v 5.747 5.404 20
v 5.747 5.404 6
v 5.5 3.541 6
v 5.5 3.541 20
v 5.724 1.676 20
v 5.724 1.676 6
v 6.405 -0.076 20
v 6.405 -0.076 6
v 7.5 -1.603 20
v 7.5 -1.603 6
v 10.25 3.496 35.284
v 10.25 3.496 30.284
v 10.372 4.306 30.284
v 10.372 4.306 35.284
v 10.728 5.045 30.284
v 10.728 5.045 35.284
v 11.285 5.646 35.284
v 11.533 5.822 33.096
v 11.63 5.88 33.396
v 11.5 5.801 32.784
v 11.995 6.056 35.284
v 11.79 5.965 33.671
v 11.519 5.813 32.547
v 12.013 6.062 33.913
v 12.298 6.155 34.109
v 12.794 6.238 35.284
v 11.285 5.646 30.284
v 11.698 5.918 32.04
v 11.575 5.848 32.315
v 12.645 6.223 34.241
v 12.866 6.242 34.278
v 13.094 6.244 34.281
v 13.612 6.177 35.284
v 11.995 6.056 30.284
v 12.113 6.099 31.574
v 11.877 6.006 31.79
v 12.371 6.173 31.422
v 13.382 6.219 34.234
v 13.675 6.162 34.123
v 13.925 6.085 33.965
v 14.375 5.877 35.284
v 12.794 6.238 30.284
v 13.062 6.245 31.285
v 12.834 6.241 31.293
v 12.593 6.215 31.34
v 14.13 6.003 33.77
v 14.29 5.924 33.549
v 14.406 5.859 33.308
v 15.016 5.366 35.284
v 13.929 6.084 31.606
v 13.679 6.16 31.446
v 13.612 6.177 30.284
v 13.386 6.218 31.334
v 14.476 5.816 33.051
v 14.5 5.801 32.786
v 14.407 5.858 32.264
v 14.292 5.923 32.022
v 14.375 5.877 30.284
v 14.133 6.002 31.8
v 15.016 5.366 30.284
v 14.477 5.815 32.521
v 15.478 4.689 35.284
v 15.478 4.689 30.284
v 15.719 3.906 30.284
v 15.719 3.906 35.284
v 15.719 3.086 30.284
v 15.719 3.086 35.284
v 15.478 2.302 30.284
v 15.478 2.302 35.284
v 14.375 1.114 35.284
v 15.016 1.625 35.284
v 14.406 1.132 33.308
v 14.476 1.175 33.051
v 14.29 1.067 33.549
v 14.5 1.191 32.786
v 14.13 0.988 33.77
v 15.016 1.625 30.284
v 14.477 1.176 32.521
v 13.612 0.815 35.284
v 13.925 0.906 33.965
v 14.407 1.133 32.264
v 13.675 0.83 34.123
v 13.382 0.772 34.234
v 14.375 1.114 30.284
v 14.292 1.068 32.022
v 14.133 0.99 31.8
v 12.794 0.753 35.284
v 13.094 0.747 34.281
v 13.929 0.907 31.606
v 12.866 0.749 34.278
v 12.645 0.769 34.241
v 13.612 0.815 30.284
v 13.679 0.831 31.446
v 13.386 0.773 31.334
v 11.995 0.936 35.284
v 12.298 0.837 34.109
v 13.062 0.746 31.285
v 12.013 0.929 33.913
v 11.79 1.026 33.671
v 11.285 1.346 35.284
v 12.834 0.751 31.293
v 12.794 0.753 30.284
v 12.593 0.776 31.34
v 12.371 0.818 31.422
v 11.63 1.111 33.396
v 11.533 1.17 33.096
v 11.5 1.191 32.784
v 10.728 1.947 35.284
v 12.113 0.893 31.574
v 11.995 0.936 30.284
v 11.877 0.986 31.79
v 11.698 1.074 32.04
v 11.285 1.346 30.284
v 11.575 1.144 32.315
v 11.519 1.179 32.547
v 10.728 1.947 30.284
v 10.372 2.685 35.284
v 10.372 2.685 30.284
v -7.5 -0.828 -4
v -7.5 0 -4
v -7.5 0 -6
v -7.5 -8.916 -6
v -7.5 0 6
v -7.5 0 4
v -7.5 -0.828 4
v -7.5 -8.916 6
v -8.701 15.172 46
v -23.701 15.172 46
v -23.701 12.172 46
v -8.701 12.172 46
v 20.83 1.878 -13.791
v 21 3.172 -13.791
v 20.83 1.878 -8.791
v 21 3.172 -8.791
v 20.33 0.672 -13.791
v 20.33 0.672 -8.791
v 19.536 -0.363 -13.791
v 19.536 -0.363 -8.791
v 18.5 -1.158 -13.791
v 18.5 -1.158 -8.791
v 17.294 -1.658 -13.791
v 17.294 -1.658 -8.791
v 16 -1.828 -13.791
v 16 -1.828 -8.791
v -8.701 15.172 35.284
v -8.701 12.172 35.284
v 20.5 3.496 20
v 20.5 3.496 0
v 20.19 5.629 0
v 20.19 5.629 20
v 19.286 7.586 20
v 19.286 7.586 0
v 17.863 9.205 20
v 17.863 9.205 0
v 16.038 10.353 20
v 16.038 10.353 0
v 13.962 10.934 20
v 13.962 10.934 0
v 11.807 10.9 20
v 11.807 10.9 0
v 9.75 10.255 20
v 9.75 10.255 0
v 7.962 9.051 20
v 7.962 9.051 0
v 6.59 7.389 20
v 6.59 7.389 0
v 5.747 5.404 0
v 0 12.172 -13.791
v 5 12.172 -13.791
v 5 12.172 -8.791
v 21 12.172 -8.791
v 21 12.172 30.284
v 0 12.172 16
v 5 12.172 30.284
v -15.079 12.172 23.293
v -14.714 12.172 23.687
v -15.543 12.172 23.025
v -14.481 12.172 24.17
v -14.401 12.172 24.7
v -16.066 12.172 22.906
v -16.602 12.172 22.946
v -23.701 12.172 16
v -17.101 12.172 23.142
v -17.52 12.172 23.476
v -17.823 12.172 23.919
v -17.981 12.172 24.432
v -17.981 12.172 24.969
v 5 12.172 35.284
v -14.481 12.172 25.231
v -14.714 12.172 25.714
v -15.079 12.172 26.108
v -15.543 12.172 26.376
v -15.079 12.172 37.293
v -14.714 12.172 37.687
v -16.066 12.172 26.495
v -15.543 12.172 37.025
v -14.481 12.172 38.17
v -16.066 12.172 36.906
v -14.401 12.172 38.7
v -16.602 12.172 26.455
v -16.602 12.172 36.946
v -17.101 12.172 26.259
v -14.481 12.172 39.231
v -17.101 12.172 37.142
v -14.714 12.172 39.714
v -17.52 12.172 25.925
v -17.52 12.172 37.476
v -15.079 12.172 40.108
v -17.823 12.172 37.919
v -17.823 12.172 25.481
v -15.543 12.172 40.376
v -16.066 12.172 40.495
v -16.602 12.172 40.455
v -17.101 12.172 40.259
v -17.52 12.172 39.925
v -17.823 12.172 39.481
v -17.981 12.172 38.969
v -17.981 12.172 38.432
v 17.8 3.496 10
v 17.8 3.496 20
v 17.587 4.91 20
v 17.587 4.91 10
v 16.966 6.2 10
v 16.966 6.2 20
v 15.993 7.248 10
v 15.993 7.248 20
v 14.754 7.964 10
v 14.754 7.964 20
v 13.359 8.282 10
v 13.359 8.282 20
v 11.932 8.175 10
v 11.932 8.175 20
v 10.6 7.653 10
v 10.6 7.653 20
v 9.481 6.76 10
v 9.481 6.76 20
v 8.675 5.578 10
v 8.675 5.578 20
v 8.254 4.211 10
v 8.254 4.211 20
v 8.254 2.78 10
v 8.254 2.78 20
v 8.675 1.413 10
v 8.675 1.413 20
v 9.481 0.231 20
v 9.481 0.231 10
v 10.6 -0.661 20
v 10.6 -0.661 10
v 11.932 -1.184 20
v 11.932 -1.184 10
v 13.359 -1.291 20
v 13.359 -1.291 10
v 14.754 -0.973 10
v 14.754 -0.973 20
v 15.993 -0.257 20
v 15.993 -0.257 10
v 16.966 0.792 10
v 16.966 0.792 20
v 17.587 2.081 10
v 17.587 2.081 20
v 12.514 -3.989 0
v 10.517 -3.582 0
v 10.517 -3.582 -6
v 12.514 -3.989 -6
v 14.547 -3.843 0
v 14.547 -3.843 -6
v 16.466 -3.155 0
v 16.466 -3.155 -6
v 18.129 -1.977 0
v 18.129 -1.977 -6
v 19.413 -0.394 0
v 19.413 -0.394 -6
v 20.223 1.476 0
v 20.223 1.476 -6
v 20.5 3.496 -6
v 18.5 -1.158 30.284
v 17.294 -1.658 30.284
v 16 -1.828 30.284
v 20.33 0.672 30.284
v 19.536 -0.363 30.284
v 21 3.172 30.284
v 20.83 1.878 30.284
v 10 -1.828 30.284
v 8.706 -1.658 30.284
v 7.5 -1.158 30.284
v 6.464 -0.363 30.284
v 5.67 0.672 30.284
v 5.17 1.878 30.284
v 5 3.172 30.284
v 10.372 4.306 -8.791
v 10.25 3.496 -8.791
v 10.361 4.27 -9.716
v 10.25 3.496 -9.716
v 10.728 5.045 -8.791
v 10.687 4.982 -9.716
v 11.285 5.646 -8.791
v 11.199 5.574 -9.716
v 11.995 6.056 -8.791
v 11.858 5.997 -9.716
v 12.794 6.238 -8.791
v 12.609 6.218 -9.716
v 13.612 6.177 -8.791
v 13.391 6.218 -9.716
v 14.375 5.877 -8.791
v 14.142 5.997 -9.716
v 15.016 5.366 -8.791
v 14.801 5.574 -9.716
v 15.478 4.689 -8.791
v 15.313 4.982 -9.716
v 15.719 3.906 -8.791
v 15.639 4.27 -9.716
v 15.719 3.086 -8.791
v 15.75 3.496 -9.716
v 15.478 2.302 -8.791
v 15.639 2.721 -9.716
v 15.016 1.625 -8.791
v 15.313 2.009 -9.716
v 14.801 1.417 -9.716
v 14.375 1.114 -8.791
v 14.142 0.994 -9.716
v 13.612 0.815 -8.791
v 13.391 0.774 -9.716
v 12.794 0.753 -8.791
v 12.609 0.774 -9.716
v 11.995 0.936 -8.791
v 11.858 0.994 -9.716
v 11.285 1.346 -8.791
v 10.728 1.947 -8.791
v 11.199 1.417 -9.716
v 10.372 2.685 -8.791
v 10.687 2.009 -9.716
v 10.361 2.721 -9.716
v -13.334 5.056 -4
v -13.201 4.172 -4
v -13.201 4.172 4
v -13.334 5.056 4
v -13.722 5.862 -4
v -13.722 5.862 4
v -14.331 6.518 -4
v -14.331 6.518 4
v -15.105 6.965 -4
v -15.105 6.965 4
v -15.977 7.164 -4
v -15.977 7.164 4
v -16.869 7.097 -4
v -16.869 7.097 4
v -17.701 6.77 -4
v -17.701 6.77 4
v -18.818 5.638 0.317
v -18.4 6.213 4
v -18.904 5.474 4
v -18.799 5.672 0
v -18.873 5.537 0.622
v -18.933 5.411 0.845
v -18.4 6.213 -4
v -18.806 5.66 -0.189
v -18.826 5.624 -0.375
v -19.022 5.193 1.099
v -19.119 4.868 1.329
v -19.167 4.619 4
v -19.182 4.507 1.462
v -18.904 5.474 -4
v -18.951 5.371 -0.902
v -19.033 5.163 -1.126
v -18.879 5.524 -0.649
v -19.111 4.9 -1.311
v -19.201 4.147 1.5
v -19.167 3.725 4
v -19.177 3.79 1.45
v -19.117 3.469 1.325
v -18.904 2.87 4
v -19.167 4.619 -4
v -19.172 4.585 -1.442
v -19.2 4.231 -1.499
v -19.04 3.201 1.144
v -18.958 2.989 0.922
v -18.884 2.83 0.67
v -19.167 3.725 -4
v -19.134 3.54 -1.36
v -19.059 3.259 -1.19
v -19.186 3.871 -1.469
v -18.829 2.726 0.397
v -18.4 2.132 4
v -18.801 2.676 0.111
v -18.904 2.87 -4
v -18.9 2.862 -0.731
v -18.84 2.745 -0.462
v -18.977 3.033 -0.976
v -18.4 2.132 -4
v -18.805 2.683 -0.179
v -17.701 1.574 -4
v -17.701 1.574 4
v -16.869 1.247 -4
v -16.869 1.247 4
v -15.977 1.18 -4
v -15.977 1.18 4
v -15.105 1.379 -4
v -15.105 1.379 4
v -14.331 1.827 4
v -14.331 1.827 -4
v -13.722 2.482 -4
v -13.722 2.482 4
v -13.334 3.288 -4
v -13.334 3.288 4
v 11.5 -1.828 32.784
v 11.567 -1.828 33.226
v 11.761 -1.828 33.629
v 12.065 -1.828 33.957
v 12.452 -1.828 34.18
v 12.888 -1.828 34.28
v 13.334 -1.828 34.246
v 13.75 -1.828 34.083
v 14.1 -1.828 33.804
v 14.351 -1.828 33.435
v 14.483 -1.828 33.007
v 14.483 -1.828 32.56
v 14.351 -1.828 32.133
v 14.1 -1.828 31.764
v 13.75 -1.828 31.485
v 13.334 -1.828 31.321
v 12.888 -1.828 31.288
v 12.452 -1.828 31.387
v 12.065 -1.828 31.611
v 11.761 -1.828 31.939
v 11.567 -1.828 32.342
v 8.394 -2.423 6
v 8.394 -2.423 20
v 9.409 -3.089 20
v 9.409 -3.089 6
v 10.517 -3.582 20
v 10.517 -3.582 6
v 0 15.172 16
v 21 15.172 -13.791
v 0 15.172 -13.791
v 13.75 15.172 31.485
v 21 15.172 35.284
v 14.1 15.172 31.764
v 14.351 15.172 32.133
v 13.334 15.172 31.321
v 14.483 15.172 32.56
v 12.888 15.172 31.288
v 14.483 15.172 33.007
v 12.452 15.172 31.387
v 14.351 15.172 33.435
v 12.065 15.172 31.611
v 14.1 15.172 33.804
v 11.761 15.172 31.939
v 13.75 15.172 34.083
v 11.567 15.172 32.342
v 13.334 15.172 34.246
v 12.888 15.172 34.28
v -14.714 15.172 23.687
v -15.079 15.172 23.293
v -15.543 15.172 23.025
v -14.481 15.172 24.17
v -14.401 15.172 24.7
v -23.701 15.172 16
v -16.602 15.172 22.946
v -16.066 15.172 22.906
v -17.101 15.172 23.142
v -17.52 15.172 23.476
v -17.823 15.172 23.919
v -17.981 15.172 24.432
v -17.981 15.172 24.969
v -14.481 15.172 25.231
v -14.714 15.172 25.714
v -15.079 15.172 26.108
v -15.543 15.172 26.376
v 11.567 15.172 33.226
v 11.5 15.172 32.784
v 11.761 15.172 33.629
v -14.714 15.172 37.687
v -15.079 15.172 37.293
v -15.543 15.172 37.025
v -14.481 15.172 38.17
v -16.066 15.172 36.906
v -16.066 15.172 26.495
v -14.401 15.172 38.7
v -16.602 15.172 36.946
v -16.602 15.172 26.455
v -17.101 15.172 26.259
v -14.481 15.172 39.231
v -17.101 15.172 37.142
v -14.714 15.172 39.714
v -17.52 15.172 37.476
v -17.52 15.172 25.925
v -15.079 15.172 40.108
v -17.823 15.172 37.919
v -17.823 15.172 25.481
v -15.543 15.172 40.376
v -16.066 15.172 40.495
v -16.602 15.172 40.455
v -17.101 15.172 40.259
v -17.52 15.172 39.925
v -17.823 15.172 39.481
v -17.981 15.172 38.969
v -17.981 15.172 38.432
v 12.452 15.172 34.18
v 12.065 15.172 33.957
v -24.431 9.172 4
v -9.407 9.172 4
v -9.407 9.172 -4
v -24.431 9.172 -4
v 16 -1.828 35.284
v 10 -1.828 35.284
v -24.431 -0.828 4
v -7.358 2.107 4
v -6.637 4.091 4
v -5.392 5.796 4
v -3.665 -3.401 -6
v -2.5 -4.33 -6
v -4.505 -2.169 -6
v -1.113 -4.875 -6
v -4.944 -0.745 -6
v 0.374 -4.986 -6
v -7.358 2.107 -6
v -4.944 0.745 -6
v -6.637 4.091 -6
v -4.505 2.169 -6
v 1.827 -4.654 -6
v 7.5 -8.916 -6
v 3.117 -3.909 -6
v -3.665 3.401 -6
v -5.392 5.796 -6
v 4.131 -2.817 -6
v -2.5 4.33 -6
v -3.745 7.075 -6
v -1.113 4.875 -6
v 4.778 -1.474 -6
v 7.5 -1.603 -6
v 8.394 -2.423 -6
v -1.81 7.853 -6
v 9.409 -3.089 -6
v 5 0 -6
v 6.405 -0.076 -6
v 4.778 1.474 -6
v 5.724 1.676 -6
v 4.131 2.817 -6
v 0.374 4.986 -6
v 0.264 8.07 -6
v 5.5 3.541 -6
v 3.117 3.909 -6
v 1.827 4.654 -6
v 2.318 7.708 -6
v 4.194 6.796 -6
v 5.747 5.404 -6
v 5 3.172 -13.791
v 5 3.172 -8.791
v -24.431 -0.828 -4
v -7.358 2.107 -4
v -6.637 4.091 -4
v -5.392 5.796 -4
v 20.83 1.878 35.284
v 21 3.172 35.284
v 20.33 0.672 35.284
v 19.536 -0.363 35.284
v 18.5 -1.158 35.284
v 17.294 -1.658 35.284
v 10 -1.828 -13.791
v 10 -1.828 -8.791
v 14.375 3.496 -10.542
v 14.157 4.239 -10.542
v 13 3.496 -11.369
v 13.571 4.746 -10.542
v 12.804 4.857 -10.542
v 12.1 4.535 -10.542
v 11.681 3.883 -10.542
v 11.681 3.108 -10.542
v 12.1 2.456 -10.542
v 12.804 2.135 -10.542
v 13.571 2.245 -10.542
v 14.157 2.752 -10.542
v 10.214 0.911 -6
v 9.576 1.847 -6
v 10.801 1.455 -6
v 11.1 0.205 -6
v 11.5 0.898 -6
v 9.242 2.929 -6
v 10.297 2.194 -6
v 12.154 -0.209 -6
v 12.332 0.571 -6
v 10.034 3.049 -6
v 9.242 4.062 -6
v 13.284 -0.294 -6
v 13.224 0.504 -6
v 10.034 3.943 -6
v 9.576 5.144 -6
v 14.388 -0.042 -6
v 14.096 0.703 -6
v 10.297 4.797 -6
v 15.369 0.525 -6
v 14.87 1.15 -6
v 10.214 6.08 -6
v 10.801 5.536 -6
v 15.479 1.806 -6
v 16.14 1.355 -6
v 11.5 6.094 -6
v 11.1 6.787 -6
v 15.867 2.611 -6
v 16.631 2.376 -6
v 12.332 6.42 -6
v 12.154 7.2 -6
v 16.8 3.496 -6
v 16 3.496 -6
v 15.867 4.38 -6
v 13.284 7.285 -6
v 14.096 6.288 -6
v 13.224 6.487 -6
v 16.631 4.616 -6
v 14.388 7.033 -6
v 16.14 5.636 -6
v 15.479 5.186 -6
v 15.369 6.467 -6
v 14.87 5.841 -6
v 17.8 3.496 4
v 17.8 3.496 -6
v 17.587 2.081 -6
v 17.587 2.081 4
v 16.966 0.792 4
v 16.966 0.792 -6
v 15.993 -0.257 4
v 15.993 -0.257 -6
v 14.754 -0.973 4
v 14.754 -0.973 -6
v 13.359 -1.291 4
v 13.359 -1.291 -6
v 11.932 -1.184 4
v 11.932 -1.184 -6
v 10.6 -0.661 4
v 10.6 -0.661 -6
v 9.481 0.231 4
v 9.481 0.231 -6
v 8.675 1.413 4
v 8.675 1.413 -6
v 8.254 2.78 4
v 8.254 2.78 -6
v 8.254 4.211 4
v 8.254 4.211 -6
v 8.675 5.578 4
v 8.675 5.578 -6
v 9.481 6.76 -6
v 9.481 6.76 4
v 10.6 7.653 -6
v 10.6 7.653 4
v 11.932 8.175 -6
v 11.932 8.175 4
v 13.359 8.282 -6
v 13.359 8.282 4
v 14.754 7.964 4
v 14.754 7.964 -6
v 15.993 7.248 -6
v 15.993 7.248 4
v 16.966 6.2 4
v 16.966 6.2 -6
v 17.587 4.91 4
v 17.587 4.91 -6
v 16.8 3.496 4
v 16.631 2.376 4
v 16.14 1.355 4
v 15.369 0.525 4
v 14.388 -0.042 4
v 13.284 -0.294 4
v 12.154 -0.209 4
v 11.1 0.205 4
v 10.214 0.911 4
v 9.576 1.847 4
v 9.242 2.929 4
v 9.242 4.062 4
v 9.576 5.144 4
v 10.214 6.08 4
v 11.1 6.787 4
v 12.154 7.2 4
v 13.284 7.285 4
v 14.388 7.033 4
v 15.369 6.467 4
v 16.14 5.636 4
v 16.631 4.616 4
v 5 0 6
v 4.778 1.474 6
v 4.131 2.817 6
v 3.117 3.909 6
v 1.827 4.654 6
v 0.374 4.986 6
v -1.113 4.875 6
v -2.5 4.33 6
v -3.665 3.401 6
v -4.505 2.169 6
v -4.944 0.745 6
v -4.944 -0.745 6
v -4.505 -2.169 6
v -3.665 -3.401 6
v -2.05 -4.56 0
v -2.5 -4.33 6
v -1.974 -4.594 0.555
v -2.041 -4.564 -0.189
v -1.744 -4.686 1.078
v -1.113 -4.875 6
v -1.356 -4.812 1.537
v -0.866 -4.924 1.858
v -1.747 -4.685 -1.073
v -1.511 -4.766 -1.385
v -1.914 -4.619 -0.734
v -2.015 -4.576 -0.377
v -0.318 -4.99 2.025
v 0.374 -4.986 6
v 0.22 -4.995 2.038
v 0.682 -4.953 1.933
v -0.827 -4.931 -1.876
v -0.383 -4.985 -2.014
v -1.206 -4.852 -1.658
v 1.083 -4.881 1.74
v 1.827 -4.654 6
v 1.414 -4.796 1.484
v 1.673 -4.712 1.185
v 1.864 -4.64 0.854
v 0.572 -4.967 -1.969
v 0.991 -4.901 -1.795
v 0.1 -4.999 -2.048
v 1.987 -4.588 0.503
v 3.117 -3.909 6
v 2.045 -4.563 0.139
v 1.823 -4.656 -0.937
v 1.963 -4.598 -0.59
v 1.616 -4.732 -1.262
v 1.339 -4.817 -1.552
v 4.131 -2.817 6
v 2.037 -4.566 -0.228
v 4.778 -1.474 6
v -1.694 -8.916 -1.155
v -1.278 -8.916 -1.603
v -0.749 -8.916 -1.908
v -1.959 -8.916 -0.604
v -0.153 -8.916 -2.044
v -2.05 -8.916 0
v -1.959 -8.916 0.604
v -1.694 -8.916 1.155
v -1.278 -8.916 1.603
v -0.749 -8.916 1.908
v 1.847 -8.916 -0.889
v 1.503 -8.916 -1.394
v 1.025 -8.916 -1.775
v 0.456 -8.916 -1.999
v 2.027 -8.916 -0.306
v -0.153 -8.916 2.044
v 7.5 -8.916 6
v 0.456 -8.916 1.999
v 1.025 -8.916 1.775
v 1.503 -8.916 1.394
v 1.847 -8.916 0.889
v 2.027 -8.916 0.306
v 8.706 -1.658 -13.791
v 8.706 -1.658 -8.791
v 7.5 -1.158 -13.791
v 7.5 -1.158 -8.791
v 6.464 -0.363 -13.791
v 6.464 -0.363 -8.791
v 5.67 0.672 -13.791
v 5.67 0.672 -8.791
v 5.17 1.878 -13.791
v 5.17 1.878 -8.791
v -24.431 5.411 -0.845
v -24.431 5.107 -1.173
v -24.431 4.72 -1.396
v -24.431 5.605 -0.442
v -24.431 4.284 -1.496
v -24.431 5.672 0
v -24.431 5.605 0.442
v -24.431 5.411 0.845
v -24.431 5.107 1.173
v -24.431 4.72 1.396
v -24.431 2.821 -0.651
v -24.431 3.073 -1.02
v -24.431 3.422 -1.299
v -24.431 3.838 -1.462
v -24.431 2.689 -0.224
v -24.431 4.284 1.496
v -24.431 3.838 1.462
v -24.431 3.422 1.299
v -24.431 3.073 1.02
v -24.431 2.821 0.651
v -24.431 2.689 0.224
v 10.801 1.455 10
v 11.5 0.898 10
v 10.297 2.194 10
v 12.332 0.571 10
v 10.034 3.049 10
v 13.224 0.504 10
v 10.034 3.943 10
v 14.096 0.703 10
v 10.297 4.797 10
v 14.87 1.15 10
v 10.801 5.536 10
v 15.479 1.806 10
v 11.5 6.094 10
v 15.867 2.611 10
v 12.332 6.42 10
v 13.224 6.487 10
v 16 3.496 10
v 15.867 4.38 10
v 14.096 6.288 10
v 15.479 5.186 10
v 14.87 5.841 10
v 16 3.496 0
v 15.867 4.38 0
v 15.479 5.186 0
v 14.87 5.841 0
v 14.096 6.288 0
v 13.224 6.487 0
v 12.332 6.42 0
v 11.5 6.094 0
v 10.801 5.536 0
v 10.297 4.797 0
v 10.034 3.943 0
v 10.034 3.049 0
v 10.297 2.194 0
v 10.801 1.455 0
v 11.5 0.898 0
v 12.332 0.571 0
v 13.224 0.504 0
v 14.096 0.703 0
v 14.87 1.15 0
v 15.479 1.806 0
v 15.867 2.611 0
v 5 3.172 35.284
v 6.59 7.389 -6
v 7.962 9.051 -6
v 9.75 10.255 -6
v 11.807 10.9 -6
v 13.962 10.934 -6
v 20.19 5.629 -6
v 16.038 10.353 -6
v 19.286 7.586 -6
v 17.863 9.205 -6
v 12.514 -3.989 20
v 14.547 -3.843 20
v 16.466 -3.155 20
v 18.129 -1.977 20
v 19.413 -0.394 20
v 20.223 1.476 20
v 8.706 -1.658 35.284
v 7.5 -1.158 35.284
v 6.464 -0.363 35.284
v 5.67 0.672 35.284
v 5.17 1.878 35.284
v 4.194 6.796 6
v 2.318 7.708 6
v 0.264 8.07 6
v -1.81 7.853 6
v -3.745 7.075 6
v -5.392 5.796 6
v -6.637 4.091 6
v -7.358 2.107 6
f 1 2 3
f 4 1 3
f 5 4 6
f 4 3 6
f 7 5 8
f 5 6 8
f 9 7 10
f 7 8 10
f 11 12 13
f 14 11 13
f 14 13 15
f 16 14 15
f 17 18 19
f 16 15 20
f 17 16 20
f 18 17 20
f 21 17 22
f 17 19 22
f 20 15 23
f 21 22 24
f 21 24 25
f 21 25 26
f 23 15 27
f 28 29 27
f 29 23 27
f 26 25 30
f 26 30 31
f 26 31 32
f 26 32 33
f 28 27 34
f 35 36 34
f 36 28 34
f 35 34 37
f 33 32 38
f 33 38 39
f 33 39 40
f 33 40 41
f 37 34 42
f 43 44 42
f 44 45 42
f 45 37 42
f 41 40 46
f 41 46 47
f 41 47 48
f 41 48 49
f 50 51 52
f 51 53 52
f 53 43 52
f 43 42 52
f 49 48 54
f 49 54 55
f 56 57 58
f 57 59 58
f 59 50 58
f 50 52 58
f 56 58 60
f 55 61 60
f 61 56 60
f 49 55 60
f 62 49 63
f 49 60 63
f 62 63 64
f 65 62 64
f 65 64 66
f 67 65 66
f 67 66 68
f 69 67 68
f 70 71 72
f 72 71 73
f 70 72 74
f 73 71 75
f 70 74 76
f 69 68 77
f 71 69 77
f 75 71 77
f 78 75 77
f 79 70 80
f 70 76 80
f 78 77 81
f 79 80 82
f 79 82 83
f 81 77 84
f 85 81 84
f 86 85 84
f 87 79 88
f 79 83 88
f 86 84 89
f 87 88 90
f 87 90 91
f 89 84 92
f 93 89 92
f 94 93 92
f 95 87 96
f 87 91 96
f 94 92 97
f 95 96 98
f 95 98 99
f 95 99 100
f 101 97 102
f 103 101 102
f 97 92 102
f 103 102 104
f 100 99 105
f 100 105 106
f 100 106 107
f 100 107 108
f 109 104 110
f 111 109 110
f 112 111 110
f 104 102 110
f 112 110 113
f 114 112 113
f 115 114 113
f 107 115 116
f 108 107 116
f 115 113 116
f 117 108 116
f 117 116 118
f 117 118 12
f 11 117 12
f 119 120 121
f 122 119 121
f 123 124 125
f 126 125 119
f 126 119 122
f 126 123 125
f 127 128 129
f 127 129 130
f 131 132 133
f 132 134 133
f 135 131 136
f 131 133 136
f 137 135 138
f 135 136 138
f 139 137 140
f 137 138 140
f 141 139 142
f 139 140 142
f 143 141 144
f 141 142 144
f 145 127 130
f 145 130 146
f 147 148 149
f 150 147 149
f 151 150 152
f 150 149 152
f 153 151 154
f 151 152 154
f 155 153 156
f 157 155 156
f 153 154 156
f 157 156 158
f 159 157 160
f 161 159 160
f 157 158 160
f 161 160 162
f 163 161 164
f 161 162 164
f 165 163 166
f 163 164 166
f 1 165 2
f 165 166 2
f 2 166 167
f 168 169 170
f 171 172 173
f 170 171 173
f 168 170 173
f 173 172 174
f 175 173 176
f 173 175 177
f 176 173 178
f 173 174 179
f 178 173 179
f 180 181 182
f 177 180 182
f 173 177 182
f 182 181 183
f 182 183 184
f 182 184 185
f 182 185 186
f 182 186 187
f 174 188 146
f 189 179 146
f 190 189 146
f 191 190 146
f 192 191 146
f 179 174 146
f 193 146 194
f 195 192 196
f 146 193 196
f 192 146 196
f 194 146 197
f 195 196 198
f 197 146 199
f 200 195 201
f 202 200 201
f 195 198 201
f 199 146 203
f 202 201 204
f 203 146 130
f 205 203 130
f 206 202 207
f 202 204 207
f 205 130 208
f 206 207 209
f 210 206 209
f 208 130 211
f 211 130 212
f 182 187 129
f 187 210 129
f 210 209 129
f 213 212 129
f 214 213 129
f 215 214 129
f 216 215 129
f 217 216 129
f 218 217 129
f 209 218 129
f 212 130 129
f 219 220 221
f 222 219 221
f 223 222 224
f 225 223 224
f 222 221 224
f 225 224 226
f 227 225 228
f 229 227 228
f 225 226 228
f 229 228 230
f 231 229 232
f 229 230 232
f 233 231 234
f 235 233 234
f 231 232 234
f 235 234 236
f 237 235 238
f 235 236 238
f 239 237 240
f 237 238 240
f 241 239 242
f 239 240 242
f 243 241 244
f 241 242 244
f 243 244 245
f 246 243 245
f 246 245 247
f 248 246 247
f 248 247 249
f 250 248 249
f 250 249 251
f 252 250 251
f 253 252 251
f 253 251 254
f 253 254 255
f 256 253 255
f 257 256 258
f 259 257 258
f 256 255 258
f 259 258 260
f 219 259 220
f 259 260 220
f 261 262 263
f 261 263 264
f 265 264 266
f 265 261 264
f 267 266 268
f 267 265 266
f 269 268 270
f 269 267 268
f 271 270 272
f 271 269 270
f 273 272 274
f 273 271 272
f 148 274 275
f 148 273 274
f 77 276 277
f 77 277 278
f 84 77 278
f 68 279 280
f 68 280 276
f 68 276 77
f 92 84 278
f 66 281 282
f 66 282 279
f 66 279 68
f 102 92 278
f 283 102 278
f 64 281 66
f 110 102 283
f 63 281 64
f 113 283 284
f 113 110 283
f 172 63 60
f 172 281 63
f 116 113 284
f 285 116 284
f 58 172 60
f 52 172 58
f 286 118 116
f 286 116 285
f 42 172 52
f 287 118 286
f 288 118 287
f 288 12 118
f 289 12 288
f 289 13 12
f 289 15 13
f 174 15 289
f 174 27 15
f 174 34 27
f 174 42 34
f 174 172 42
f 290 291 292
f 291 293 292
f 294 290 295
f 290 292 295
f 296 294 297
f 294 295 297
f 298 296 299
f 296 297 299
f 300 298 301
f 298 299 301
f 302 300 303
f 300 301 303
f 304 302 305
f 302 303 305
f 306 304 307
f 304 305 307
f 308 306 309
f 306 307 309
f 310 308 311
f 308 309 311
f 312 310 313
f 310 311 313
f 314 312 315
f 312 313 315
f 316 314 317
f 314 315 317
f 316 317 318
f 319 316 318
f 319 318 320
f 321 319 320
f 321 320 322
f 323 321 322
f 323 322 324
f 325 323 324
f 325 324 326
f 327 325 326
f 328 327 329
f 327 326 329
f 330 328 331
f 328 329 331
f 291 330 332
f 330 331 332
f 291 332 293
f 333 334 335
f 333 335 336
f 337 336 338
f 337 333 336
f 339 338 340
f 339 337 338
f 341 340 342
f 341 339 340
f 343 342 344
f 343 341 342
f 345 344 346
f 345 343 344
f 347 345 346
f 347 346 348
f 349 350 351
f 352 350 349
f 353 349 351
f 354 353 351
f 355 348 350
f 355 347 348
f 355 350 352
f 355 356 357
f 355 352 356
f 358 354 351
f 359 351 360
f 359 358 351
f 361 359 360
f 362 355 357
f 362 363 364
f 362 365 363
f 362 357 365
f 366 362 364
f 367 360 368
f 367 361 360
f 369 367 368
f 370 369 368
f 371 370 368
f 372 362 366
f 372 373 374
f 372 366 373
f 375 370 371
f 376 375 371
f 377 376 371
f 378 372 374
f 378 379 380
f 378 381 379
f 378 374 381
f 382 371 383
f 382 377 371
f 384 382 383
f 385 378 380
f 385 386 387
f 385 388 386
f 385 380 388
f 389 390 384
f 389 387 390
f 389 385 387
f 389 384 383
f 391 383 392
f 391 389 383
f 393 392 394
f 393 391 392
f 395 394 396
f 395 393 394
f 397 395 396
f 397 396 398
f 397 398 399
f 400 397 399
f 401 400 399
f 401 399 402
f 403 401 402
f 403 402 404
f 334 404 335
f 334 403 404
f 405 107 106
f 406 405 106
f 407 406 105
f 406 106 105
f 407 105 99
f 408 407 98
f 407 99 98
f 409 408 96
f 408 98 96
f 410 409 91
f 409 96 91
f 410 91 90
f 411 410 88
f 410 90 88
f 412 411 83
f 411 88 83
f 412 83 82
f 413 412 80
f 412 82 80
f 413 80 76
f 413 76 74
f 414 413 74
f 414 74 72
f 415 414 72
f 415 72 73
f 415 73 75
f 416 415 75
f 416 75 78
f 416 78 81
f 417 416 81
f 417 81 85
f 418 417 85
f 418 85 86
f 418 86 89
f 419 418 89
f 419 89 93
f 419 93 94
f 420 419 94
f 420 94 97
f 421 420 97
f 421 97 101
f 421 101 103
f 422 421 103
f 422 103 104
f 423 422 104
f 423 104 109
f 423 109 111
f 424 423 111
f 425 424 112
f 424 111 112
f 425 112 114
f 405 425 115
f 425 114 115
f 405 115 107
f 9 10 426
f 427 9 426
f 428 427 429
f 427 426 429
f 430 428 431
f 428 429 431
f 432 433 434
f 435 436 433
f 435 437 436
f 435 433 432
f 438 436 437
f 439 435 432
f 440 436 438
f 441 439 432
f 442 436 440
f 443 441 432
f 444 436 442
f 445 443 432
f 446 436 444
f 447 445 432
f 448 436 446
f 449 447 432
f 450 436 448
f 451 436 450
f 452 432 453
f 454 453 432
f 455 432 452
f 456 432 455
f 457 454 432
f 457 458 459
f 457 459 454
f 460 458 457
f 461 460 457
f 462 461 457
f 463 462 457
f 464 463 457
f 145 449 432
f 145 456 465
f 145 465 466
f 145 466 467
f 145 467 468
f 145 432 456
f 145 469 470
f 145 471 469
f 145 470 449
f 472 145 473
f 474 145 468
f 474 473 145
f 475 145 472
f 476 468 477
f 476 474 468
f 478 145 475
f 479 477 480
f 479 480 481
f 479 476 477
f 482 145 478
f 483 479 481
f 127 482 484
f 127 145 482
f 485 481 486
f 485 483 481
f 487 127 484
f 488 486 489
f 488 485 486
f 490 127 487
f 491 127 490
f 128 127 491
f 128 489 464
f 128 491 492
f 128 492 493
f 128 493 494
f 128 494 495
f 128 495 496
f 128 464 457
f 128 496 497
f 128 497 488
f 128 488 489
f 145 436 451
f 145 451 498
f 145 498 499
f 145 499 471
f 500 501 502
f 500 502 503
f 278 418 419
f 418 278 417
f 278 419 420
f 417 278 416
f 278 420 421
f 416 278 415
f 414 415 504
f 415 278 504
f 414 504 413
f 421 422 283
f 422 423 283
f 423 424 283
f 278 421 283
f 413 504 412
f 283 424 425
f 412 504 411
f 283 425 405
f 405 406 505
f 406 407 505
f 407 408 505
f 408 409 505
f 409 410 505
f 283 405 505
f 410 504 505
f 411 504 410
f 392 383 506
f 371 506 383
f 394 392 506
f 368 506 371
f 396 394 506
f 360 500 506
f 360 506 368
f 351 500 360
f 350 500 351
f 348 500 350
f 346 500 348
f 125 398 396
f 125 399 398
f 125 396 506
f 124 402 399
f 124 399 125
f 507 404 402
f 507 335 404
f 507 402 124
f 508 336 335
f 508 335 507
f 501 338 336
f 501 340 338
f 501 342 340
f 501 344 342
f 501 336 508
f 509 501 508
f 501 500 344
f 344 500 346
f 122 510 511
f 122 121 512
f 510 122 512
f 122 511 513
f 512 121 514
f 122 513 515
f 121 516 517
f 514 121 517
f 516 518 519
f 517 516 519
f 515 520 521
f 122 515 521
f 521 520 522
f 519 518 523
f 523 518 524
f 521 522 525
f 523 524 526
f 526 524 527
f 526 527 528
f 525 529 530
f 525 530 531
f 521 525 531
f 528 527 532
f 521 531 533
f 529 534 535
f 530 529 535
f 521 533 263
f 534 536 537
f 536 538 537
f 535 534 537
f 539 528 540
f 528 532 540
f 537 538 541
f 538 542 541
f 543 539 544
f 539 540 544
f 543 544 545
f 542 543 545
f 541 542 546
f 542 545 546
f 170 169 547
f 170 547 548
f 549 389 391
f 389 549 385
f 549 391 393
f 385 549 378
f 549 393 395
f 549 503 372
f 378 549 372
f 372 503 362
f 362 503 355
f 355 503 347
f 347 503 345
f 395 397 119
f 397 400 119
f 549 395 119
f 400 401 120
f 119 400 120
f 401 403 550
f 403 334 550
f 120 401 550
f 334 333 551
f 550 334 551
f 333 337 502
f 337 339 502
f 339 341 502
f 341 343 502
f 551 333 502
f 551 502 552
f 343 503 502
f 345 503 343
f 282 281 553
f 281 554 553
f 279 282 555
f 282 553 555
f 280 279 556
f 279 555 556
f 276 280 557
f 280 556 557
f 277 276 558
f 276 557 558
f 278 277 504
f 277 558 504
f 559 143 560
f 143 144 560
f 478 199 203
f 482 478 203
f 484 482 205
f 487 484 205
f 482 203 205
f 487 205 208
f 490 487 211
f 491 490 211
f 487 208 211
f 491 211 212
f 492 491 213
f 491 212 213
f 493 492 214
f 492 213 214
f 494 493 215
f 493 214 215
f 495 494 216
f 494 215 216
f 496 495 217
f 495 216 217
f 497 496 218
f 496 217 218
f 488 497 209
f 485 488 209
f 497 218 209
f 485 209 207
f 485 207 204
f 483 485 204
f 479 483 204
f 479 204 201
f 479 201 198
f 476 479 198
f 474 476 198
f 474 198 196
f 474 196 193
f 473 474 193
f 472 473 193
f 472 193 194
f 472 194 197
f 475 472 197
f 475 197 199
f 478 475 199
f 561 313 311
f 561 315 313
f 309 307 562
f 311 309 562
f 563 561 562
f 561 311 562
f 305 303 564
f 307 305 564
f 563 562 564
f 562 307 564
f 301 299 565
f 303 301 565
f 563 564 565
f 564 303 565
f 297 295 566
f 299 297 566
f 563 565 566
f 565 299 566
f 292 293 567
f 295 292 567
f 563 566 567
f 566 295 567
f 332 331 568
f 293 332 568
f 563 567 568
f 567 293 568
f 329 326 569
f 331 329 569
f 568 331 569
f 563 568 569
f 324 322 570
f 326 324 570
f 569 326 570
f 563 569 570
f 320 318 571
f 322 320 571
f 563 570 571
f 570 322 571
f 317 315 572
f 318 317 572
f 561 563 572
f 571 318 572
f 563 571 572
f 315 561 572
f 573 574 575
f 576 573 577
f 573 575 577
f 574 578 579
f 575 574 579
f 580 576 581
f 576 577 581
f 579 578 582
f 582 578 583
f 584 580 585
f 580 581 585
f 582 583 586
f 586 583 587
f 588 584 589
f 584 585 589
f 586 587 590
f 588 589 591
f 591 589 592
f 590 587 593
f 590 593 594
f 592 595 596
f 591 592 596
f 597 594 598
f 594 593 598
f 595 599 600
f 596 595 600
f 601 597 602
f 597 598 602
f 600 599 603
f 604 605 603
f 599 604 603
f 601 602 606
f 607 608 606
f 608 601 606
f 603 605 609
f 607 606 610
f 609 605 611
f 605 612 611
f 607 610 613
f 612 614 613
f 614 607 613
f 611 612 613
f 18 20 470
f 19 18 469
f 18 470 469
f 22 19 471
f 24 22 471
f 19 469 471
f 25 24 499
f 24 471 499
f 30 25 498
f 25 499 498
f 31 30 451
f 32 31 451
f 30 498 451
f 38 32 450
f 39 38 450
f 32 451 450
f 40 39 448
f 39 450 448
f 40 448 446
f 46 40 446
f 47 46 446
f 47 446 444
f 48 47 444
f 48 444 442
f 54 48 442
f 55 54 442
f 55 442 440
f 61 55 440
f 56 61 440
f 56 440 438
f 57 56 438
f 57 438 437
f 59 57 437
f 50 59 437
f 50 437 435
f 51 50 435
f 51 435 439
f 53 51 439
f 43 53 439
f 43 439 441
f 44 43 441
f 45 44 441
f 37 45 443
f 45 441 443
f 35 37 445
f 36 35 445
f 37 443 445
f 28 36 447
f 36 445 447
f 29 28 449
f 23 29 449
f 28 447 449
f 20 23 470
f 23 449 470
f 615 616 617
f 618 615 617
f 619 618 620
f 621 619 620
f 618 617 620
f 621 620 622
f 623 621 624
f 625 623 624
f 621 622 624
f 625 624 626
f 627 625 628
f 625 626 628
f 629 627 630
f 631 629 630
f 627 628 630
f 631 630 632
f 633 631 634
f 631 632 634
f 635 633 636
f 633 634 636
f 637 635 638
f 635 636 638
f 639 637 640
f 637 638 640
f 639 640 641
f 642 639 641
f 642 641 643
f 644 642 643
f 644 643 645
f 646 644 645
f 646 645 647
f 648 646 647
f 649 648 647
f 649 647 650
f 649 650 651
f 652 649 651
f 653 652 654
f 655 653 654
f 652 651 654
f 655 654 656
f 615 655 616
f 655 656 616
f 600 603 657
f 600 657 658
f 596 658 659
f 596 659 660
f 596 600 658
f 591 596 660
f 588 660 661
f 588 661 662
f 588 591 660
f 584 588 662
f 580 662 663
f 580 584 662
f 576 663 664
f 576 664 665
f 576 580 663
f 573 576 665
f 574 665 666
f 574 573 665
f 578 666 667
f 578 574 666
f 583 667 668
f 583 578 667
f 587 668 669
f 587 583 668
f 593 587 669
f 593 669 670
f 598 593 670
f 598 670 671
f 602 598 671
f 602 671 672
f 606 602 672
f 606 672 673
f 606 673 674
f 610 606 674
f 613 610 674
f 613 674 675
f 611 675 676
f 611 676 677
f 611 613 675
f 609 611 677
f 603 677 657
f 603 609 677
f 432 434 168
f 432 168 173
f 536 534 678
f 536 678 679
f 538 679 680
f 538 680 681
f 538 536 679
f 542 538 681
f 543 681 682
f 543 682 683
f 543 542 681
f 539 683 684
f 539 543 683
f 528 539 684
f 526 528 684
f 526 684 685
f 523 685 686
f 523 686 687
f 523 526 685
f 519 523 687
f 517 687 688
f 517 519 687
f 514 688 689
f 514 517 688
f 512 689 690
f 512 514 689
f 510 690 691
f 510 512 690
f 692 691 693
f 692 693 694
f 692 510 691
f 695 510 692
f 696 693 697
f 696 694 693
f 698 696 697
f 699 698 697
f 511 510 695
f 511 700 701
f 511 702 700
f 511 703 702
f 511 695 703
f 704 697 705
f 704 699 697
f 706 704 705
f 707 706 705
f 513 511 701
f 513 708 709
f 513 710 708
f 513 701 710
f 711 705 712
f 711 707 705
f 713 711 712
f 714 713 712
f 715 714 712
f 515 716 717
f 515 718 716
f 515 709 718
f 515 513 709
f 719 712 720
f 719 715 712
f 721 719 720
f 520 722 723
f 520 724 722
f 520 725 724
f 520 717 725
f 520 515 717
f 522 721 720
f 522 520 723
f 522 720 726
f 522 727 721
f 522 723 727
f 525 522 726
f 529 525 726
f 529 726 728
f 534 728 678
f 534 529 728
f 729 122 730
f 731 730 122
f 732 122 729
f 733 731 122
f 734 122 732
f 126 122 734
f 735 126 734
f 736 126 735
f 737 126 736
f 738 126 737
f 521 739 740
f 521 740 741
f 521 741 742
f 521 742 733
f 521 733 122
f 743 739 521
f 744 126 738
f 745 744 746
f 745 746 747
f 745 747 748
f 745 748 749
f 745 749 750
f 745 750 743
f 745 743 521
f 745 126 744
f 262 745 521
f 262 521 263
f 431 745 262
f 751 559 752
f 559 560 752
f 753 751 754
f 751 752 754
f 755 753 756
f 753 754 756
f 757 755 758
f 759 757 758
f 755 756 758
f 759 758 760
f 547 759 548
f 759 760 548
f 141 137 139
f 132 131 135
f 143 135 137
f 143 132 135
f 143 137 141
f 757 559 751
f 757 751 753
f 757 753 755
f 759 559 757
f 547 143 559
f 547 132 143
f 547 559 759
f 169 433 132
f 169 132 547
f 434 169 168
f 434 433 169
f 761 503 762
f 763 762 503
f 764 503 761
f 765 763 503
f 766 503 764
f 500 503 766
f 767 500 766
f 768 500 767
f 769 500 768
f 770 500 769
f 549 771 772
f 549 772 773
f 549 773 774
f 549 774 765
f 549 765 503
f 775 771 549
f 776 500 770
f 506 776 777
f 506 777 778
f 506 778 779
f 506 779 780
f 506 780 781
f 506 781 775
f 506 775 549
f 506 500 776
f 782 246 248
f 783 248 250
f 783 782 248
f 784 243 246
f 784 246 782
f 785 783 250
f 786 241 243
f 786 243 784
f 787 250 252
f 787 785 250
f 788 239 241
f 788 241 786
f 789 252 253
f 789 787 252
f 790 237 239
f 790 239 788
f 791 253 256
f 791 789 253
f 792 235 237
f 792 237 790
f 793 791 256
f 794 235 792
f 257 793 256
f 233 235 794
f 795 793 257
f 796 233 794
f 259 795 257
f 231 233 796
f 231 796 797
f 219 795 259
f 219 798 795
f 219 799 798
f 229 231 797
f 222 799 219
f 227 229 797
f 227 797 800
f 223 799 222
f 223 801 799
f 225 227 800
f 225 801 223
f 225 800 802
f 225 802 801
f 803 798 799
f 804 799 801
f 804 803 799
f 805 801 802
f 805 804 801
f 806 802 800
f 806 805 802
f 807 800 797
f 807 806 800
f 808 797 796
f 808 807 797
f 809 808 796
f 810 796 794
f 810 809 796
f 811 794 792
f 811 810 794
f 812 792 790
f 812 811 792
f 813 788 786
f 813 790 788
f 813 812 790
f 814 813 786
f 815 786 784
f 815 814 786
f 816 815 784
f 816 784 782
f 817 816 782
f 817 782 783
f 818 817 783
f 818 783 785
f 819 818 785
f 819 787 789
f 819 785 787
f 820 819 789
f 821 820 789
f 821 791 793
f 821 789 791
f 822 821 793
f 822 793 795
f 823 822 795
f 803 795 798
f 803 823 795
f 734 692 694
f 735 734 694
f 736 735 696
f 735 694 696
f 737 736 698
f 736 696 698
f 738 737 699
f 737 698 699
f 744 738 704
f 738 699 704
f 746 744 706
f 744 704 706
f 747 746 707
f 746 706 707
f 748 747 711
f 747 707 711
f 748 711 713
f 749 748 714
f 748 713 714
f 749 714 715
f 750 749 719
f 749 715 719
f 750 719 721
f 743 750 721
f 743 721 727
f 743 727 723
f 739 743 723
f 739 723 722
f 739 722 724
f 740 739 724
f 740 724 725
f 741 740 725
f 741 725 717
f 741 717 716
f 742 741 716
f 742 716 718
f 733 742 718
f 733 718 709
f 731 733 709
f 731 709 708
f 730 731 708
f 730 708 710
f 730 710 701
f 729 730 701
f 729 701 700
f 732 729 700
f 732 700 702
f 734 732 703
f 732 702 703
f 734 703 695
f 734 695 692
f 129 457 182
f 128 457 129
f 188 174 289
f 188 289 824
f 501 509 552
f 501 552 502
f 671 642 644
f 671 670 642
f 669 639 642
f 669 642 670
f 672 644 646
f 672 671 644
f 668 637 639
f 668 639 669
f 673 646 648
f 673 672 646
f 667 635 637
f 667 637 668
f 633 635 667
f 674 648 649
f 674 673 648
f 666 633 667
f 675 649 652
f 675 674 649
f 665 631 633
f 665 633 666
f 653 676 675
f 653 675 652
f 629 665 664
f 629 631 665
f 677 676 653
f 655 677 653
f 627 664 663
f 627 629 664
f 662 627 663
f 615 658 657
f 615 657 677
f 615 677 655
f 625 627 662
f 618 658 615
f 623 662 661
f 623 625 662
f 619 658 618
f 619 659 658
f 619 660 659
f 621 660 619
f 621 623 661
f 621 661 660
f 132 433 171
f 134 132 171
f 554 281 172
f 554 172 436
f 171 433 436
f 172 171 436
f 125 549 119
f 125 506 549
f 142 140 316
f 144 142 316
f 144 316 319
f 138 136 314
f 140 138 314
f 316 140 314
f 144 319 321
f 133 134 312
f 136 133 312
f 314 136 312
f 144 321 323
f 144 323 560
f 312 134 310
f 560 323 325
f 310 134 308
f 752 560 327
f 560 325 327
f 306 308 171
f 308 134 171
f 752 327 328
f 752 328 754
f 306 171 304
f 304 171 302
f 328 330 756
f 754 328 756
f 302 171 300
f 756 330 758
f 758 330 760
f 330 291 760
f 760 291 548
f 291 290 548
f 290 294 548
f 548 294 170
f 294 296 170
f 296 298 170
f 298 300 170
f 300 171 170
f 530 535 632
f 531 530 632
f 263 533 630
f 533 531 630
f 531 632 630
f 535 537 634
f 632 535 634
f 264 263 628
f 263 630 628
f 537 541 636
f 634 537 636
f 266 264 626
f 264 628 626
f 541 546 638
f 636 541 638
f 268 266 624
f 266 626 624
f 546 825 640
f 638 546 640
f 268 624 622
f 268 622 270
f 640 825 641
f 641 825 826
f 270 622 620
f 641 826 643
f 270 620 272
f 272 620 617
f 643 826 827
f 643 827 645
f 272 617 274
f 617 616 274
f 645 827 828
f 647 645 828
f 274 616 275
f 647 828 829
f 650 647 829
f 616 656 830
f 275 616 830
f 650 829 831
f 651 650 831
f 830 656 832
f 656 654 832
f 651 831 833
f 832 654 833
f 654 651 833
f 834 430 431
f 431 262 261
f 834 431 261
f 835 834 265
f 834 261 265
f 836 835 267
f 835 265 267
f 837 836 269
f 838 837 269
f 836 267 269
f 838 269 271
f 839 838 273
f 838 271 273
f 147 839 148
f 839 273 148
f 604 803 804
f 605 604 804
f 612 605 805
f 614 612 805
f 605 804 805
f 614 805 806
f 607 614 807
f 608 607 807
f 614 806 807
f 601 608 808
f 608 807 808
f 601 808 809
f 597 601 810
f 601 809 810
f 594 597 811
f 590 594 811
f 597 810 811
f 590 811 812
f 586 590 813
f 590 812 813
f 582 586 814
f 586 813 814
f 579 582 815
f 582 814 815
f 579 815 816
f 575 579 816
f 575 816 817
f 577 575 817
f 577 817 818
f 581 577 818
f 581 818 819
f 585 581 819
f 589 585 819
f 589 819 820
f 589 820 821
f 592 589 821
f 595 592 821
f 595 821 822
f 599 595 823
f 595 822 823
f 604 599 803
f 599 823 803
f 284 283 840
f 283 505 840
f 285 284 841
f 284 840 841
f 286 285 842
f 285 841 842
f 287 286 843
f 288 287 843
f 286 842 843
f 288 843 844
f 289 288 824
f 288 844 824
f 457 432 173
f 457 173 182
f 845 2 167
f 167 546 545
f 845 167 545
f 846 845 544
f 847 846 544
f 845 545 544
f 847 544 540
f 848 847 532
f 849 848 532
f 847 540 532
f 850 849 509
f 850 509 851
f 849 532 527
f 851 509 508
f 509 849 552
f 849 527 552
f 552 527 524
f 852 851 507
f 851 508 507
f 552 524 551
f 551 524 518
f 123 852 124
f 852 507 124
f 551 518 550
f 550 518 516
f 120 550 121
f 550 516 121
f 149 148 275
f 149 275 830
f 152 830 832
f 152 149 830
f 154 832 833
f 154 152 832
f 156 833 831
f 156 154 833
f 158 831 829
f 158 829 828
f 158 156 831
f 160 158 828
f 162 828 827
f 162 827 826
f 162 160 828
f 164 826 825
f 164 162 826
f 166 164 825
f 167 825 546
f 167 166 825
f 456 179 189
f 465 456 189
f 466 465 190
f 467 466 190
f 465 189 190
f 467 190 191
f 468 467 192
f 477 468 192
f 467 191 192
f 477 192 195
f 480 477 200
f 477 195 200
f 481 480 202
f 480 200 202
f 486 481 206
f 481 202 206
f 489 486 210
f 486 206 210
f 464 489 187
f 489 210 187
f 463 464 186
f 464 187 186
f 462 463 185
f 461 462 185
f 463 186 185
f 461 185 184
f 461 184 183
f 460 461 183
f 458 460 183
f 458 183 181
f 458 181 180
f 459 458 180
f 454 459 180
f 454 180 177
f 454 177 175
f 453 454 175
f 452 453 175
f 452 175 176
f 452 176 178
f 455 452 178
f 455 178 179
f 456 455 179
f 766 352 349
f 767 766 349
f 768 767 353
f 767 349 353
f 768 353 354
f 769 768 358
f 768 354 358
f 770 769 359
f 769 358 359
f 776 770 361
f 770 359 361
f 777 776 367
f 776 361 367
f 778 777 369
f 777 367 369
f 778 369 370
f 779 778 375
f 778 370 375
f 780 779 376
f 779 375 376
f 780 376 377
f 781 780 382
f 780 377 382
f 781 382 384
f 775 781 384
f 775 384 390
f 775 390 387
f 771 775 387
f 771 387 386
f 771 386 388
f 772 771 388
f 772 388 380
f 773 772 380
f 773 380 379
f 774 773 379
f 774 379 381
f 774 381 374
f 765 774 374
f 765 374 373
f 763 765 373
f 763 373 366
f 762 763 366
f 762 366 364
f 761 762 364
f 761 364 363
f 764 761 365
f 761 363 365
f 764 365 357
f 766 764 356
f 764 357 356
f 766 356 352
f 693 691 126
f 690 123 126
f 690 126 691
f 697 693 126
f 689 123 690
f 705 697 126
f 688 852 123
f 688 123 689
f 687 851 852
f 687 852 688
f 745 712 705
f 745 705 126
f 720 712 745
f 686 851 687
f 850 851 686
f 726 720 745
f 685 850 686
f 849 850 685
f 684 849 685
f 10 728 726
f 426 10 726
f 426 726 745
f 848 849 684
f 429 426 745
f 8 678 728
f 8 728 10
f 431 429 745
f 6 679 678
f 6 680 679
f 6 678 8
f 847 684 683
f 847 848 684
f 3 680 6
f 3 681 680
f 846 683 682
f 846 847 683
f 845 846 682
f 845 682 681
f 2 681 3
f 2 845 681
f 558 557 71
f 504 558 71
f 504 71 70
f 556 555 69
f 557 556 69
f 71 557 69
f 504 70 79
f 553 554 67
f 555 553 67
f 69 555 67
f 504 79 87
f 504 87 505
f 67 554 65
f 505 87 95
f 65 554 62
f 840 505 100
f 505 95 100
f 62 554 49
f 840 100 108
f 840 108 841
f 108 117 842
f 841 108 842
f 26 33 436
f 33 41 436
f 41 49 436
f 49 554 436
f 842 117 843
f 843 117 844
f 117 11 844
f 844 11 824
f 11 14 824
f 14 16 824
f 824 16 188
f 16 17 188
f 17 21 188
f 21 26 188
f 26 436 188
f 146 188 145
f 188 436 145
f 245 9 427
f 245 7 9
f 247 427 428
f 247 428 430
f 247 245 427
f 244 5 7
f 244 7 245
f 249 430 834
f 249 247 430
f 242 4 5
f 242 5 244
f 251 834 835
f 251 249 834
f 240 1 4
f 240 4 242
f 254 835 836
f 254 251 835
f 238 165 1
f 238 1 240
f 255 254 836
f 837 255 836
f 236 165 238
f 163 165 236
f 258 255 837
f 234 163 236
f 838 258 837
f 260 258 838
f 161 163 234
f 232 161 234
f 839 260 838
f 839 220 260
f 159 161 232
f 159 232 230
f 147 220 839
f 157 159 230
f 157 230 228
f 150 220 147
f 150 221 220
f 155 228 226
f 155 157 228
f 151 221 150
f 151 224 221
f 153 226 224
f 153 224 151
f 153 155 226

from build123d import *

# Parameters (mm, degrees)
F0_R      = 5
F1_DEPTH  = 6
F0_R_2    = 4.8
F0_R_3    = 3
F2_DEPTH  = 20
F3_DEPTH  = 6
F4_DEPTH  = 4
F5_R      = 4.8
F6_DEPTH  = 10
F7_R      = 4.8
F7_R_2    = 3.8
F8_DEPTH  = 10
F10_D     = 3
F10_DEPTH = 8
F10_TIP   = 0.9012909285
F12_D     = 4.1
F12_DEPTH = 8
F12_TIP   = 1.231764269
F15_DEPTH = 3
F14_W     = 16
F14_H     = 5
F16_DEPTH = 17
F17_D     = 3.6
F19_D     = 5.5
F19_DEPTH = 45
F19_TIP   = 1.6523667023
F20_R     = 5
F22_D     = 3


with BuildPart() as f1:
    # F0 (on Top) → F1 (new body, symmetric)
    with BuildSketch(Plane.XY):
        with BuildLine():
            Line((7.5, -8.9160166681), (7.5, -1.6033675178))
            ThreePointArc((7.5, -1.6033675178), (5.724190526, 1.6755980136), (5.7469759312, 5.4044845859))
            ThreePointArc((5.7469759312, 5.4044845859), (0.2642961594, 8.069590647), (-5.3920486551, 5.7961942593))
            ThreePointArc((-5.3920486551, 5.7961942593), (-7.0675453026, 3.1241309575), (-7.5, 0))
            Line((-7.5, 0), (-7.5, -0.8279169323))
            Line((-7.5, -0.8279169323), (-7.5, -8.9160166681))
            Line((-7.5, -8.9160166681), (7.5, -8.9160166681))
        make_face()
        Circle(F0_R, mode=Mode.SUBTRACT)
        with BuildLine():
            Line((7.5, -8.9160166681), (10.5173872741, -3.5815391175))
            ThreePointArc((10.5173872741, -3.5815391175), (8.88796678, -2.7766030053), (7.5, -1.6033675178))
            Line((7.5, -1.6033675178), (7.5, -8.9160166681))
        make_face()
    extrude(amount=F1_DEPTH, both=True)

    # F0 (on Top) → F2 (join)
    with BuildSketch(Plane.XY):
        with BuildLine():
            ThreePointArc((7.5, -1.6033675178), (8.88796678, -2.7766030053), (10.5173872741, -3.5815391175))
            ThreePointArc((10.5173872741, -3.5815391175), (17.3376493955, -2.6227463013), (20.5, 3.4956519958))
            ThreePointArc((20.5, 3.4956519958), (13.9623719353, 10.9336517442), (5.7469759312, 5.4044845859))
            ThreePointArc((5.7469759312, 5.4044845859), (7.1535100643, 2.8741627566), (7.5, 0))
            Line((7.5, 0), (7.5, -1.6033675178))
        make_face()
        with Locations((13, 3.4956519958)):
            Circle(F0_R_2, mode=Mode.SUBTRACT)
        with BuildLine():
            ThreePointArc((5.7469759312, 5.4044845859), (5.724190526, 1.6755980136), (7.5, -1.6033675178))
            Line((7.5, -1.6033675178), (7.5, 0))
            ThreePointArc((7.5, 0), (7.1535100643, 2.8741627566), (5.7469759312, 5.4044845859))
        make_face()
        with Locations((13, 3.4956519958)):
            Circle(F0_R_2)
        with Locations((13, 3.4956519958)):
            Circle(F0_R_3, mode=Mode.SUBTRACT)
    extrude(amount=F2_DEPTH)

    # F0 (on Top) → F3 (join, through all)
    with BuildSketch(Plane.XY):
        with BuildLine():
            ThreePointArc((5.7469759312, 5.4044845859), (5.724190526, 1.6755980136), (7.5, -1.6033675178))
            Line((7.5, -1.6033675178), (7.5, 0))
            ThreePointArc((7.5, 0), (7.1535100643, 2.8741627566), (5.7469759312, 5.4044845859))
        make_face()
        with BuildLine():
            ThreePointArc((7.5, -1.6033675178), (8.88796678, -2.7766030053), (10.5173872741, -3.5815391175))
            ThreePointArc((10.5173872741, -3.5815391175), (17.3376493955, -2.6227463013), (20.5, 3.4956519958))
            ThreePointArc((20.5, 3.4956519958), (13.9623719353, 10.9336517442), (5.7469759312, 5.4044845859))
            ThreePointArc((5.7469759312, 5.4044845859), (7.1535100643, 2.8741627566), (7.5, 0))
            Line((7.5, 0), (7.5, -1.6033675178))
        make_face()
        with Locations((13, 3.4956519958)):
            Circle(F0_R_2, mode=Mode.SUBTRACT)
        with Locations((13, 3.4956519958)):
            Circle(F0_R_2)
        with Locations((13, 3.4956519958)):
            Circle(F0_R_3, mode=Mode.SUBTRACT)
    extrude(amount=-F3_DEPTH)

    # F0 (on Top) → F4 (join, symmetric)
    with BuildSketch(Plane.XY):
        with BuildLine():
            ThreePointArc((-7.5, 0), (-7.0675453026, 3.1241309575), (-5.3920486551, 5.7961942593))
            Line((-5.3920486551, 5.7961942593), (-9.4072079159, 9.1720830677))
            Line((-9.4072079159, 9.1720830677), (-24.4306735694, 9.1720830677))
            Line((-24.4306735694, 9.1720830677), (-24.4306735694, -0.8279169323))
            Line((-24.4306735694, -0.8279169323), (-7.5, -0.8279169323))
            Line((-7.5, -0.8279169323), (-7.5, 0))
        make_face()
        with Locations((-16.2010006607, 4.1720830677)):
            Circle(F0_R_3, mode=Mode.SUBTRACT)
    extrude(amount=F4_DEPTH, both=True)

    # F5 (on face) → F6 (cut)
    with BuildSketch(Plane.XY.offset(20)):
        with Locations((13, 3.4956519958)):
            Circle(F5_R)
    extrude(amount=-F6_DEPTH, mode=Mode.SUBTRACT)

    # F7 (on face) → F8 (cut)
    with BuildSketch(Plane(origin=(0, 0, -6), x_dir=(1, 0, 0), z_dir=(0, 0, -1))):
        with Locations((13, -3.4956519958)):
            Circle(F7_R)
        with Locations((13, -3.4956519958)):
            Circle(F7_R_2, mode=Mode.SUBTRACT)
    extrude(amount=-F8_DEPTH, mode=Mode.SUBTRACT)

    # F10
    with Locations(Plane(origin=(-24.4306735694, 0, 0), x_dir=(0, -1, 0), z_dir=(-1, 0, 0))):
        with Locations((-4.1720830677, 0)):
            Hole(F10_D / 2, depth=F10_DEPTH)
            with Locations((0, 0, -(F10_DEPTH + F10_TIP / 2))):  # 118° drill point
                Cone(0, F10_D / 2, F10_TIP, mode=Mode.SUBTRACT)

    # F12
    with Locations(Plane.XZ.offset(8.9160166681)):
        with Locations((0, 0)):
            Hole(F12_D / 2, depth=F12_DEPTH)
            with Locations((0, 0, -(F12_DEPTH + F12_TIP / 2))):  # 118° drill point
                Cone(0, F12_D / 2, F12_TIP, mode=Mode.SUBTRACT)


with BuildPart() as f15:
    # F14 (on offset) → F15 (new body)
    with BuildSketch(Plane(origin=(0, 15.1720830677, 0), x_dir=(-1, 0, 0), z_dir=(0, 1, 0))):
        Polygon((0, 16), (23.7010006607, 16), (23.7010006607, 46), (8.7010006607, 46), (8.7010006607, 35.2837964892), (-5, 35.2837964892), (-5, 30.2837964892), (-21, 30.2837964892), (-21, -8.7910083532), (-5, -8.7910083532), (-5, -13.7910083532), (0, -13.7910083532), align=None)
    extrude(amount=-F15_DEPTH)

    # F14 (on offset) → F16 (join)
    with BuildSketch(Plane(origin=(0, 15.1720830677, 0), x_dir=(-1, 0, 0), z_dir=(0, 1, 0))):
        with Locations((-13, 32.7837964892)):
            Rectangle(F14_W, F14_H)
        with Locations((-13, -11.2910083532)):
            Rectangle(F14_W, F14_H)
    extrude(amount=-F16_DEPTH)

    # F17 (through all)
    with Locations(Plane(origin=(0, 15.1720830677, 0), x_dir=(-1, 0, 0), z_dir=(0, 1, 0))):
        with Locations((16.2010006607, 38.7004814446), (16.2010006607, 24.7004814446)):
            Hole(F17_D / 2)

    # F19
    with Locations(Plane.XY.offset(35.2837964892)):
        with Locations((13, 3.4956519958)):
            Hole(F19_D / 2, depth=F19_DEPTH)
            with Locations((0, 0, -(F19_DEPTH + F19_TIP / 2))):  # 118° drill point
                Cone(0, F19_D / 2, F19_TIP, mode=Mode.SUBTRACT)

    # F20
    f20_edges = [f15.edges().sort_by_distance(p)[0] for p in [
        (5, -1.827917, 32.783796),
        (21, -1.827917, 32.783796),
        (5, -1.827917, -11.291008),
        (21, -1.827917, -11.291008),
    ]]
    fillet(f20_edges, radius=F20_R)

    # F22 (through all)
    with Locations(Plane.XZ.offset(1.8279169323)):
        with Locations((13, 32.7837964892)):
            Hole(F22_D / 2)


solid = Compound([f1.part, f15.part])
